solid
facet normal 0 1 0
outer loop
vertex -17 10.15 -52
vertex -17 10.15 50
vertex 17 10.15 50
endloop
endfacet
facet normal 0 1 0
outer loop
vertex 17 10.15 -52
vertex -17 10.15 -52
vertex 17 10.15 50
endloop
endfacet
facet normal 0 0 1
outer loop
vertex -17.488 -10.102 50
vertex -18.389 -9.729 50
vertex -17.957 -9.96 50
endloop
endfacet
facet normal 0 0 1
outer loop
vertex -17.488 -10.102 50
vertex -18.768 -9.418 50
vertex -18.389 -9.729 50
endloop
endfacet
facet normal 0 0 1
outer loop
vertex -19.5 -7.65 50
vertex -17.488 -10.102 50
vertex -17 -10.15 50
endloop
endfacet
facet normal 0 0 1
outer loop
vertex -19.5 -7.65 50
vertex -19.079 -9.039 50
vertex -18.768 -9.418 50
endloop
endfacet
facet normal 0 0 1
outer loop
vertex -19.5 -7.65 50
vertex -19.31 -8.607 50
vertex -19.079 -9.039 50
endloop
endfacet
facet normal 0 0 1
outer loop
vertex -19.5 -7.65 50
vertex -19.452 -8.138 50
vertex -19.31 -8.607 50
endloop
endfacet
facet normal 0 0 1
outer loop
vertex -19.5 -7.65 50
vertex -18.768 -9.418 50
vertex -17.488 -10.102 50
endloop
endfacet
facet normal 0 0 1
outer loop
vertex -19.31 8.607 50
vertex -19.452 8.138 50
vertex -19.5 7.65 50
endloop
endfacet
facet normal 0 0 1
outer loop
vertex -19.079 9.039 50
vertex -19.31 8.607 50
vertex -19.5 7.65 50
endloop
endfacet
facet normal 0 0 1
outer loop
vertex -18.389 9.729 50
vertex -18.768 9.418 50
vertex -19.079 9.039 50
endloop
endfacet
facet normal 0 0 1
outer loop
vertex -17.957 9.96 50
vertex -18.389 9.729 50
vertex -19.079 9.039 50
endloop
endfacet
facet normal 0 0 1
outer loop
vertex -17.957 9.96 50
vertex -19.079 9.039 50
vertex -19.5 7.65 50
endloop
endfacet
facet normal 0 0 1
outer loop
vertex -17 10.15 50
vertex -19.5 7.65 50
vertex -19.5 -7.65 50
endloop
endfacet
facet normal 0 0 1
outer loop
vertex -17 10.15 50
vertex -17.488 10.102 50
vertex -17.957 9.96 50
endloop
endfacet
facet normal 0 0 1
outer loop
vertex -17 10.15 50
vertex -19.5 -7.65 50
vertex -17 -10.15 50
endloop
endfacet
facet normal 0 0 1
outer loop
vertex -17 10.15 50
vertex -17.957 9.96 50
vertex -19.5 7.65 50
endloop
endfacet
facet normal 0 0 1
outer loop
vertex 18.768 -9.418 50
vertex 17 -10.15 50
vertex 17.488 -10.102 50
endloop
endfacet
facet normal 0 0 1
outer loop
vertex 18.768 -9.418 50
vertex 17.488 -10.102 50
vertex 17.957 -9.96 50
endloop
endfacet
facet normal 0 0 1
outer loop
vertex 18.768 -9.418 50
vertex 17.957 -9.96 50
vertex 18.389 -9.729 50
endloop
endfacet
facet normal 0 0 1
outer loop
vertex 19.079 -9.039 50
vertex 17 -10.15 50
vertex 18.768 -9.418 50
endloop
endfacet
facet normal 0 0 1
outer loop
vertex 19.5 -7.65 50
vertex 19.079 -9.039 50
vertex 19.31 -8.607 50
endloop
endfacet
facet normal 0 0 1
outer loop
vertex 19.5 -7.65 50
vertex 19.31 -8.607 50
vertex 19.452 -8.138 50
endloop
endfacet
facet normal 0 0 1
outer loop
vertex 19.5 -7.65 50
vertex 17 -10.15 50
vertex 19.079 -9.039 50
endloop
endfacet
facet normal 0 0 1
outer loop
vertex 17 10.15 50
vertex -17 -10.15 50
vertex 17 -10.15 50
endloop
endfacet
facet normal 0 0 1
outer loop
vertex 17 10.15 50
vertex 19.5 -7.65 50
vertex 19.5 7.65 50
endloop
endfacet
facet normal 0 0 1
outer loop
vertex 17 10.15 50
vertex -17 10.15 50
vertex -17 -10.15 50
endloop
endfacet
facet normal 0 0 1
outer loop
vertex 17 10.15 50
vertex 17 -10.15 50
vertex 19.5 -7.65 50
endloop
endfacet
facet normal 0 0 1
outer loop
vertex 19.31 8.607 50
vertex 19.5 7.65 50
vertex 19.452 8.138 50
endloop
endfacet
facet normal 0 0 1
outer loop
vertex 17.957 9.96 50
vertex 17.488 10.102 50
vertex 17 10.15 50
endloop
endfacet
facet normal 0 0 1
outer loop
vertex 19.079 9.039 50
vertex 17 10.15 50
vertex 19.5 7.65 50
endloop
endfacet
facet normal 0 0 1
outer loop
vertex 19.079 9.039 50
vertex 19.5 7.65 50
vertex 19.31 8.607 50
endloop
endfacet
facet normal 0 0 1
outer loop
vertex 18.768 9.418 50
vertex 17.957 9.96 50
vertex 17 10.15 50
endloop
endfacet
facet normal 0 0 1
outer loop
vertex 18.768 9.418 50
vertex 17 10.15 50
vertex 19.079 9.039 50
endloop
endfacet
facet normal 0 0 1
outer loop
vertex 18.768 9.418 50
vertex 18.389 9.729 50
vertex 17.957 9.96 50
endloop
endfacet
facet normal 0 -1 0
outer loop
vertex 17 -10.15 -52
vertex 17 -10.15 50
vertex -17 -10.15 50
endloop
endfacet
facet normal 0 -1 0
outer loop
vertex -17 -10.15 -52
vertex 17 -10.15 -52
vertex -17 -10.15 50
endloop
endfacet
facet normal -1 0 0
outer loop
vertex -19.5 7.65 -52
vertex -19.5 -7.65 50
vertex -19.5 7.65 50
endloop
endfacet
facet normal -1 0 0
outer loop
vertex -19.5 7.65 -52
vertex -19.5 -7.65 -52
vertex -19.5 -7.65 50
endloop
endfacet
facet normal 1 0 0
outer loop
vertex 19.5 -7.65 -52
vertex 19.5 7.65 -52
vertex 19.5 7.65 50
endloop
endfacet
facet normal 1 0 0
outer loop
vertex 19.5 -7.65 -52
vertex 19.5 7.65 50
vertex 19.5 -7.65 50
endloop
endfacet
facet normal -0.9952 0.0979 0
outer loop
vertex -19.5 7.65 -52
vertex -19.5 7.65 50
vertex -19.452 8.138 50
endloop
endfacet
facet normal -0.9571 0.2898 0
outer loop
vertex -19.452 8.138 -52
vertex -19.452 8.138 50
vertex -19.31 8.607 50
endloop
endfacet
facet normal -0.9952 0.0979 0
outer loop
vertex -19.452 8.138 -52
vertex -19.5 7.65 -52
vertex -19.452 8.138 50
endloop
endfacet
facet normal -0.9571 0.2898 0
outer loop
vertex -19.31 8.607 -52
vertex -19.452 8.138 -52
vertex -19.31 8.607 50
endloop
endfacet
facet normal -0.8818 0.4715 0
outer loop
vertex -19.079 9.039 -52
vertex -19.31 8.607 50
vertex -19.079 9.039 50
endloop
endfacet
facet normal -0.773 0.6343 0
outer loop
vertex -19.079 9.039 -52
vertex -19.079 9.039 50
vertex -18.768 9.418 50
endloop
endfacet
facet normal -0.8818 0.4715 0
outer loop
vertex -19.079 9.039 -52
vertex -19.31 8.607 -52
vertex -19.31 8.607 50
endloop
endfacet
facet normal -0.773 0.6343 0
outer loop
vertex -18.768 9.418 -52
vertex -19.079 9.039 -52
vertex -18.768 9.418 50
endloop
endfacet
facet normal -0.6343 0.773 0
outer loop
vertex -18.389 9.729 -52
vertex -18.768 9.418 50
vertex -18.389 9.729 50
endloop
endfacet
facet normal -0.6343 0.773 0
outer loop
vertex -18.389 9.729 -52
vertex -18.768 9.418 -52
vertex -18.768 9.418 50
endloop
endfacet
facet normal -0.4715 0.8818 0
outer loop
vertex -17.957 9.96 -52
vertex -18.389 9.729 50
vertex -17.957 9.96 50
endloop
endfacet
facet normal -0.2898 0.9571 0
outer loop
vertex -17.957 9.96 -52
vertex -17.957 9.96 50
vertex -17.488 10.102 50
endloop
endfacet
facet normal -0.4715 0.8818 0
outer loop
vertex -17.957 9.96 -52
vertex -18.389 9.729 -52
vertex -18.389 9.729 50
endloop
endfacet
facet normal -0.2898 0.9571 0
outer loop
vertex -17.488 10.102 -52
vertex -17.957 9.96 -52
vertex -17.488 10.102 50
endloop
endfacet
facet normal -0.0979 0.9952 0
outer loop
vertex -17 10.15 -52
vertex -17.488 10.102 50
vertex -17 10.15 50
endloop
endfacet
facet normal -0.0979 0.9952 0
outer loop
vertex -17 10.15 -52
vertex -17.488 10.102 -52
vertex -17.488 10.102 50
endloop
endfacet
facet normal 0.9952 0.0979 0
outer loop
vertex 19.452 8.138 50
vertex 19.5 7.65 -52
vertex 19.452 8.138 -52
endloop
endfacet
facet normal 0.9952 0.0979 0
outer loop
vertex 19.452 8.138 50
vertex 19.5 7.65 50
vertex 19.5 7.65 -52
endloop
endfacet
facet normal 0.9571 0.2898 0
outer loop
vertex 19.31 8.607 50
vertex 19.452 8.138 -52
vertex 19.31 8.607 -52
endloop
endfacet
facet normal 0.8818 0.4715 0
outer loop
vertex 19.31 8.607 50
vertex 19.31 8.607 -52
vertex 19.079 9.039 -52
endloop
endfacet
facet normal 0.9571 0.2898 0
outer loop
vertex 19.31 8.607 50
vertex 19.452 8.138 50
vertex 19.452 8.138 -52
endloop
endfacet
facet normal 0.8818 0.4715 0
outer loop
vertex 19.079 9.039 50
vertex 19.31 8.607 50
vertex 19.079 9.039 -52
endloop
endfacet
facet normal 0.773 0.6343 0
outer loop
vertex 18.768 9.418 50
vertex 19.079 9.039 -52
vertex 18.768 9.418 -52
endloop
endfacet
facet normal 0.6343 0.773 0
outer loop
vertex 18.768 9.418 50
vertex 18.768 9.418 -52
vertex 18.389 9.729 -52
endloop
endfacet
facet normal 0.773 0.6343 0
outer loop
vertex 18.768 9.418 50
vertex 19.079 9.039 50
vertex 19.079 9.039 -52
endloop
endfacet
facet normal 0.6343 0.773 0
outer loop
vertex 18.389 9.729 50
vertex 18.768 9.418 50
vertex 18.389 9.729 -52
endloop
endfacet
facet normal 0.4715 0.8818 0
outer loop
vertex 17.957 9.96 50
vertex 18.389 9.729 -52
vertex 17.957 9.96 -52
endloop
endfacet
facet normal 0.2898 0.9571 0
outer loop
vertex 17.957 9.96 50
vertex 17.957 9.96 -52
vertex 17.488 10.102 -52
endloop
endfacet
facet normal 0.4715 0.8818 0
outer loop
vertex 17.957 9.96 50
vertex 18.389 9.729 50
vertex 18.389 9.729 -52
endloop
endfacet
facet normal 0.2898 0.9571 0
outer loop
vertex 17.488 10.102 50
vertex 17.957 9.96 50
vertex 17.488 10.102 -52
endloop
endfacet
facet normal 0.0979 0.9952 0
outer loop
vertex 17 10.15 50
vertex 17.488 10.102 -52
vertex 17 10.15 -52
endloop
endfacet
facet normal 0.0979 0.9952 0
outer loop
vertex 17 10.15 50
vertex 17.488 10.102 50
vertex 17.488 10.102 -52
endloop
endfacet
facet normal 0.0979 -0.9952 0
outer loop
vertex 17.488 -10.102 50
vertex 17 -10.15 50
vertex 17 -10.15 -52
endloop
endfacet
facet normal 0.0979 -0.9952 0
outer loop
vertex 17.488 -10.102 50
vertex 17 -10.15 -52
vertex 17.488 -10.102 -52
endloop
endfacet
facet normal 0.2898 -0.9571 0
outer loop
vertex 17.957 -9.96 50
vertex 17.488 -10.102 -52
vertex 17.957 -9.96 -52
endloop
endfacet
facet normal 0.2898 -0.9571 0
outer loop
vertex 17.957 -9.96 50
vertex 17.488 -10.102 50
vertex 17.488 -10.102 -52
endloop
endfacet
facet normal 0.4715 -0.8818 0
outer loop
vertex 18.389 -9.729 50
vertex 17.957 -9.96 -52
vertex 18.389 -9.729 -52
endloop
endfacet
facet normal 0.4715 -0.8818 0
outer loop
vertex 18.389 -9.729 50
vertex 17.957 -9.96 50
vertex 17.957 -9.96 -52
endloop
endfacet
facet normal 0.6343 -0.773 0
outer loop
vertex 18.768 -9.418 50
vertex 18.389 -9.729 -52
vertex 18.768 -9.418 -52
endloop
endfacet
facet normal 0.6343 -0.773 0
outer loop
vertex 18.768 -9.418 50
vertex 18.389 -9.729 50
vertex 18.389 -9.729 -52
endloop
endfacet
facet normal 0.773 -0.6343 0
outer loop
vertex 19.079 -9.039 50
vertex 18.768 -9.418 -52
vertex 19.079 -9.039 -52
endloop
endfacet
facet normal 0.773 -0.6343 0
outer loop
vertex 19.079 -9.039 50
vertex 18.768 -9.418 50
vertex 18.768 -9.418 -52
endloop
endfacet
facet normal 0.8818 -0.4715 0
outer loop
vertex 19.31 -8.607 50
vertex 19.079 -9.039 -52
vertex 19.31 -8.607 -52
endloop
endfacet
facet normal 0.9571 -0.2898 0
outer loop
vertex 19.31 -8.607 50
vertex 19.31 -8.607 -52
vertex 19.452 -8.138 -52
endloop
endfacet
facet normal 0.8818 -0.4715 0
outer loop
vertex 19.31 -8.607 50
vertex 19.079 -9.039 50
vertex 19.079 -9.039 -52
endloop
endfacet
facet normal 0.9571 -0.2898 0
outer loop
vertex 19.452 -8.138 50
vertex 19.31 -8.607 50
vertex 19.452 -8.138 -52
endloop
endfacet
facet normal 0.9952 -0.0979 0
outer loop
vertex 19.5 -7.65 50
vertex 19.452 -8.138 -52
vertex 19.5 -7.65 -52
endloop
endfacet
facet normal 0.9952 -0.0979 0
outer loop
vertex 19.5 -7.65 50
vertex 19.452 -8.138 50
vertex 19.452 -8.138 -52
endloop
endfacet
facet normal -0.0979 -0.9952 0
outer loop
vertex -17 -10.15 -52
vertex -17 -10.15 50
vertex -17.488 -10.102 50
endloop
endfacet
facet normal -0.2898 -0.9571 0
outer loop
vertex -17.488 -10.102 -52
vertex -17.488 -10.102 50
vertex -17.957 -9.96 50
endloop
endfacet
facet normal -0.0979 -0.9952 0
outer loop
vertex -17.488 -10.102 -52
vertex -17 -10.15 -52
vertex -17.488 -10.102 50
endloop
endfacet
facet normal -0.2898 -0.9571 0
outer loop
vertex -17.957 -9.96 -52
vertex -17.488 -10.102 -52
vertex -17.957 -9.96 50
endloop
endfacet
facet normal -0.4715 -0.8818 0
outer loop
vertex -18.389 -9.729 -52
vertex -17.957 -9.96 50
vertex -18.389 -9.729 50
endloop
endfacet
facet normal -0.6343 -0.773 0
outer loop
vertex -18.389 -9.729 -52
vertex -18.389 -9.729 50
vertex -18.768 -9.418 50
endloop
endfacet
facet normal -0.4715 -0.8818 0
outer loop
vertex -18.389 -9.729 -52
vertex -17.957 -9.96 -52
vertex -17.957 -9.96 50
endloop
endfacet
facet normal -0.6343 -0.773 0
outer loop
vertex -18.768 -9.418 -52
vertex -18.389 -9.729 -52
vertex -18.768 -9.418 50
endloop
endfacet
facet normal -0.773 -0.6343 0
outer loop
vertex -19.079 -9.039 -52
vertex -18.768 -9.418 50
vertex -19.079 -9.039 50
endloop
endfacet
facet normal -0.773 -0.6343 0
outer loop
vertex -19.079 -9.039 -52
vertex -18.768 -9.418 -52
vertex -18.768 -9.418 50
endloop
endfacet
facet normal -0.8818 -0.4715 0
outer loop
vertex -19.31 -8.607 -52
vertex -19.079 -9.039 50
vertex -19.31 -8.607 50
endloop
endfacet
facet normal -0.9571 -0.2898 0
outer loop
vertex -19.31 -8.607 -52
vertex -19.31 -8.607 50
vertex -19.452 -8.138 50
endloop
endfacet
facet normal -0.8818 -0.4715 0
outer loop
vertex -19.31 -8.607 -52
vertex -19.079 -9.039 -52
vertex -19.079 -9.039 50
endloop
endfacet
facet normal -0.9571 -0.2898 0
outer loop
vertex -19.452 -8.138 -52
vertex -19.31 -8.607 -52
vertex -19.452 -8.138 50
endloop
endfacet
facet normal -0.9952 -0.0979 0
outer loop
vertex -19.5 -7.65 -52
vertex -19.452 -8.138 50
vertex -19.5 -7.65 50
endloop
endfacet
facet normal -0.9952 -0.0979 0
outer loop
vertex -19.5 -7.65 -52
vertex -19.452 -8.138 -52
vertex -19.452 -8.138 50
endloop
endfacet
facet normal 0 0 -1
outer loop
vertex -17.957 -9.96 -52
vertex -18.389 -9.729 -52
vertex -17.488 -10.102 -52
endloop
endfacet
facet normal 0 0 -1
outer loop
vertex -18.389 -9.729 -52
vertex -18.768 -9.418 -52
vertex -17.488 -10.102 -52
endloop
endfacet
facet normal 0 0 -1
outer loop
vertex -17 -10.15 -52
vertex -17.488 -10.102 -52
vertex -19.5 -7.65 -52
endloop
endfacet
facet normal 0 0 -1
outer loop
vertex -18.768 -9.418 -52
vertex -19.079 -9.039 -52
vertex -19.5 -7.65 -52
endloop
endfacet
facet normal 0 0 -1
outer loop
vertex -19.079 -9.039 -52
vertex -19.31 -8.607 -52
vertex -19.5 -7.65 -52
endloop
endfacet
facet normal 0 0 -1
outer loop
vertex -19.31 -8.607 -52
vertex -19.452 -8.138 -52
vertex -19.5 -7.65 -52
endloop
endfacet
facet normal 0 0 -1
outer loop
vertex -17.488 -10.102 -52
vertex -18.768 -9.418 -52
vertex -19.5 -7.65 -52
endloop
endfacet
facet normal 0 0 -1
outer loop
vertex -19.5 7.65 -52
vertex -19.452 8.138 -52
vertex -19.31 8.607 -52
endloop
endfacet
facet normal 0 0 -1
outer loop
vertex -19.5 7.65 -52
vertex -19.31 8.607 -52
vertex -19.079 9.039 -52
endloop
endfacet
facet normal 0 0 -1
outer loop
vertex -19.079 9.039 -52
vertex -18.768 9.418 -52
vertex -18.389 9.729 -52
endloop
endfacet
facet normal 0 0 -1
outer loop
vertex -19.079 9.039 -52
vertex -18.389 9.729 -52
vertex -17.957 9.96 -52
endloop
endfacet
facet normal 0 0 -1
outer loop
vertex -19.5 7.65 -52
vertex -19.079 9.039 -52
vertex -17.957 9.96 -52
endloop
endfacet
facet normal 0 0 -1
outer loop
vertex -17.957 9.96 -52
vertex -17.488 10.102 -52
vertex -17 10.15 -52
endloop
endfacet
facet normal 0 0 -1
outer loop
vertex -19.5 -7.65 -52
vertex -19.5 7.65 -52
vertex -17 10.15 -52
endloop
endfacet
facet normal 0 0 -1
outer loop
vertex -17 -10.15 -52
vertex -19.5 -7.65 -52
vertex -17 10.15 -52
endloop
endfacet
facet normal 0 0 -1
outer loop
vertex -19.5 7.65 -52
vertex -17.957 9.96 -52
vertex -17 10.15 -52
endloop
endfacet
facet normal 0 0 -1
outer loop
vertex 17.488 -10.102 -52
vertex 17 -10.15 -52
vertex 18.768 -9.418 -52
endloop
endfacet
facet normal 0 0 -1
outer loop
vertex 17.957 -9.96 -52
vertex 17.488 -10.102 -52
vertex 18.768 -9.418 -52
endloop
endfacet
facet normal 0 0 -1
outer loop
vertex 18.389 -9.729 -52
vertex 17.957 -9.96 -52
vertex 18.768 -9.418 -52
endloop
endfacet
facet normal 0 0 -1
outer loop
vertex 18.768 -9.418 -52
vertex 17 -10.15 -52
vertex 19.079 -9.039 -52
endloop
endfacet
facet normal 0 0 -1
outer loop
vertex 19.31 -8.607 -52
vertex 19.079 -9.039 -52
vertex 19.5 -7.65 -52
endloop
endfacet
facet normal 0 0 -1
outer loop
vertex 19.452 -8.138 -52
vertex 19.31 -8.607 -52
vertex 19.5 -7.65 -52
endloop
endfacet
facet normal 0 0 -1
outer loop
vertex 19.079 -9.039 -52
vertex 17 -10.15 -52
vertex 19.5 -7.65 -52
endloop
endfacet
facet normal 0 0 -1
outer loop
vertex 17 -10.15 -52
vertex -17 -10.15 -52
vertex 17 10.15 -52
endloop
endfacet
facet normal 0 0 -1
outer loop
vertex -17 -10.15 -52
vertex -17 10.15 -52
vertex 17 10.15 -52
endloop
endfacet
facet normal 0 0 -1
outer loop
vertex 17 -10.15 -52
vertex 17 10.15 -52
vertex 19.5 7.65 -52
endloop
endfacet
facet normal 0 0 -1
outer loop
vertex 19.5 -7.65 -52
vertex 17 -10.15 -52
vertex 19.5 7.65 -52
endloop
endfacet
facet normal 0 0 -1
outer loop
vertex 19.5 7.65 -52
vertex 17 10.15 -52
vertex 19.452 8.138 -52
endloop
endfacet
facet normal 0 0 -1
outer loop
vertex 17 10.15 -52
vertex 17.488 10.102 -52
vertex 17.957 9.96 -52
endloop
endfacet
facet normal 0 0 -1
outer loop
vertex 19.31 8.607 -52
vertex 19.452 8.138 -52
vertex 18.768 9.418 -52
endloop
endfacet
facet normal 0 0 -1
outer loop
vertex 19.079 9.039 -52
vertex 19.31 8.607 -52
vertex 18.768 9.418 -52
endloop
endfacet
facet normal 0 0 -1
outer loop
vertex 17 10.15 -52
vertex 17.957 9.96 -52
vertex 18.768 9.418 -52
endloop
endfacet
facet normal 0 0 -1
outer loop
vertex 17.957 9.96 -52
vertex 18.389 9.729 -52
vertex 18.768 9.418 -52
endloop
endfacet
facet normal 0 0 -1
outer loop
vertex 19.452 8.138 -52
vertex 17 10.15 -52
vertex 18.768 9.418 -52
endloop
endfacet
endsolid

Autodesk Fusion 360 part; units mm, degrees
sketch "Sketch1" plane through (0, 0, 0) normal (0, 0, 1) x (1, 0, 0)
  line L0 (-18, -11) -> (18, -11)
  arc A0 (18, -11) -> (18, 11) centre (18, 0) ccw
  line L1 (18, 11) -> (-18, 11)
  arc A1 (-18, 11) -> (-18, -11) centre (-18, 0) ccw
  line L2 (-29, 0) -> (29, 0) construction
  line L3 (19.5, -10.15) -> (-19.5, -10.15)
  line L4 (-19.5, -10.15) -> (-19.5, 10.15)
  line L5 (-19.5, 10.15) -> (19.5, 10.15)
  line L6 (19.5, 10.15) -> (19.5, -10.15)
  line L7 (19.5, -10.15) -> (-19.5, 10.15) construction
  line L8 (-19.5, -10.15) -> (19.5, 10.15) construction
  dimension "d5" = 58
  dimension "d6" = 22
  dimension "d7" = 20.3
  dimension "d8" = 39
extrude "Extrude1" add sketch "Sketch1" along normal blind 50 and the other way blind 52 contours L3 L4 L5 L6
fillet "Fillet1" radius 2.5 4 edges at (19.5, -10.15, -1) (-19.5, -10.15, -1) (19.5, 10.15, -1) (-19.5, 10.15, -1)
